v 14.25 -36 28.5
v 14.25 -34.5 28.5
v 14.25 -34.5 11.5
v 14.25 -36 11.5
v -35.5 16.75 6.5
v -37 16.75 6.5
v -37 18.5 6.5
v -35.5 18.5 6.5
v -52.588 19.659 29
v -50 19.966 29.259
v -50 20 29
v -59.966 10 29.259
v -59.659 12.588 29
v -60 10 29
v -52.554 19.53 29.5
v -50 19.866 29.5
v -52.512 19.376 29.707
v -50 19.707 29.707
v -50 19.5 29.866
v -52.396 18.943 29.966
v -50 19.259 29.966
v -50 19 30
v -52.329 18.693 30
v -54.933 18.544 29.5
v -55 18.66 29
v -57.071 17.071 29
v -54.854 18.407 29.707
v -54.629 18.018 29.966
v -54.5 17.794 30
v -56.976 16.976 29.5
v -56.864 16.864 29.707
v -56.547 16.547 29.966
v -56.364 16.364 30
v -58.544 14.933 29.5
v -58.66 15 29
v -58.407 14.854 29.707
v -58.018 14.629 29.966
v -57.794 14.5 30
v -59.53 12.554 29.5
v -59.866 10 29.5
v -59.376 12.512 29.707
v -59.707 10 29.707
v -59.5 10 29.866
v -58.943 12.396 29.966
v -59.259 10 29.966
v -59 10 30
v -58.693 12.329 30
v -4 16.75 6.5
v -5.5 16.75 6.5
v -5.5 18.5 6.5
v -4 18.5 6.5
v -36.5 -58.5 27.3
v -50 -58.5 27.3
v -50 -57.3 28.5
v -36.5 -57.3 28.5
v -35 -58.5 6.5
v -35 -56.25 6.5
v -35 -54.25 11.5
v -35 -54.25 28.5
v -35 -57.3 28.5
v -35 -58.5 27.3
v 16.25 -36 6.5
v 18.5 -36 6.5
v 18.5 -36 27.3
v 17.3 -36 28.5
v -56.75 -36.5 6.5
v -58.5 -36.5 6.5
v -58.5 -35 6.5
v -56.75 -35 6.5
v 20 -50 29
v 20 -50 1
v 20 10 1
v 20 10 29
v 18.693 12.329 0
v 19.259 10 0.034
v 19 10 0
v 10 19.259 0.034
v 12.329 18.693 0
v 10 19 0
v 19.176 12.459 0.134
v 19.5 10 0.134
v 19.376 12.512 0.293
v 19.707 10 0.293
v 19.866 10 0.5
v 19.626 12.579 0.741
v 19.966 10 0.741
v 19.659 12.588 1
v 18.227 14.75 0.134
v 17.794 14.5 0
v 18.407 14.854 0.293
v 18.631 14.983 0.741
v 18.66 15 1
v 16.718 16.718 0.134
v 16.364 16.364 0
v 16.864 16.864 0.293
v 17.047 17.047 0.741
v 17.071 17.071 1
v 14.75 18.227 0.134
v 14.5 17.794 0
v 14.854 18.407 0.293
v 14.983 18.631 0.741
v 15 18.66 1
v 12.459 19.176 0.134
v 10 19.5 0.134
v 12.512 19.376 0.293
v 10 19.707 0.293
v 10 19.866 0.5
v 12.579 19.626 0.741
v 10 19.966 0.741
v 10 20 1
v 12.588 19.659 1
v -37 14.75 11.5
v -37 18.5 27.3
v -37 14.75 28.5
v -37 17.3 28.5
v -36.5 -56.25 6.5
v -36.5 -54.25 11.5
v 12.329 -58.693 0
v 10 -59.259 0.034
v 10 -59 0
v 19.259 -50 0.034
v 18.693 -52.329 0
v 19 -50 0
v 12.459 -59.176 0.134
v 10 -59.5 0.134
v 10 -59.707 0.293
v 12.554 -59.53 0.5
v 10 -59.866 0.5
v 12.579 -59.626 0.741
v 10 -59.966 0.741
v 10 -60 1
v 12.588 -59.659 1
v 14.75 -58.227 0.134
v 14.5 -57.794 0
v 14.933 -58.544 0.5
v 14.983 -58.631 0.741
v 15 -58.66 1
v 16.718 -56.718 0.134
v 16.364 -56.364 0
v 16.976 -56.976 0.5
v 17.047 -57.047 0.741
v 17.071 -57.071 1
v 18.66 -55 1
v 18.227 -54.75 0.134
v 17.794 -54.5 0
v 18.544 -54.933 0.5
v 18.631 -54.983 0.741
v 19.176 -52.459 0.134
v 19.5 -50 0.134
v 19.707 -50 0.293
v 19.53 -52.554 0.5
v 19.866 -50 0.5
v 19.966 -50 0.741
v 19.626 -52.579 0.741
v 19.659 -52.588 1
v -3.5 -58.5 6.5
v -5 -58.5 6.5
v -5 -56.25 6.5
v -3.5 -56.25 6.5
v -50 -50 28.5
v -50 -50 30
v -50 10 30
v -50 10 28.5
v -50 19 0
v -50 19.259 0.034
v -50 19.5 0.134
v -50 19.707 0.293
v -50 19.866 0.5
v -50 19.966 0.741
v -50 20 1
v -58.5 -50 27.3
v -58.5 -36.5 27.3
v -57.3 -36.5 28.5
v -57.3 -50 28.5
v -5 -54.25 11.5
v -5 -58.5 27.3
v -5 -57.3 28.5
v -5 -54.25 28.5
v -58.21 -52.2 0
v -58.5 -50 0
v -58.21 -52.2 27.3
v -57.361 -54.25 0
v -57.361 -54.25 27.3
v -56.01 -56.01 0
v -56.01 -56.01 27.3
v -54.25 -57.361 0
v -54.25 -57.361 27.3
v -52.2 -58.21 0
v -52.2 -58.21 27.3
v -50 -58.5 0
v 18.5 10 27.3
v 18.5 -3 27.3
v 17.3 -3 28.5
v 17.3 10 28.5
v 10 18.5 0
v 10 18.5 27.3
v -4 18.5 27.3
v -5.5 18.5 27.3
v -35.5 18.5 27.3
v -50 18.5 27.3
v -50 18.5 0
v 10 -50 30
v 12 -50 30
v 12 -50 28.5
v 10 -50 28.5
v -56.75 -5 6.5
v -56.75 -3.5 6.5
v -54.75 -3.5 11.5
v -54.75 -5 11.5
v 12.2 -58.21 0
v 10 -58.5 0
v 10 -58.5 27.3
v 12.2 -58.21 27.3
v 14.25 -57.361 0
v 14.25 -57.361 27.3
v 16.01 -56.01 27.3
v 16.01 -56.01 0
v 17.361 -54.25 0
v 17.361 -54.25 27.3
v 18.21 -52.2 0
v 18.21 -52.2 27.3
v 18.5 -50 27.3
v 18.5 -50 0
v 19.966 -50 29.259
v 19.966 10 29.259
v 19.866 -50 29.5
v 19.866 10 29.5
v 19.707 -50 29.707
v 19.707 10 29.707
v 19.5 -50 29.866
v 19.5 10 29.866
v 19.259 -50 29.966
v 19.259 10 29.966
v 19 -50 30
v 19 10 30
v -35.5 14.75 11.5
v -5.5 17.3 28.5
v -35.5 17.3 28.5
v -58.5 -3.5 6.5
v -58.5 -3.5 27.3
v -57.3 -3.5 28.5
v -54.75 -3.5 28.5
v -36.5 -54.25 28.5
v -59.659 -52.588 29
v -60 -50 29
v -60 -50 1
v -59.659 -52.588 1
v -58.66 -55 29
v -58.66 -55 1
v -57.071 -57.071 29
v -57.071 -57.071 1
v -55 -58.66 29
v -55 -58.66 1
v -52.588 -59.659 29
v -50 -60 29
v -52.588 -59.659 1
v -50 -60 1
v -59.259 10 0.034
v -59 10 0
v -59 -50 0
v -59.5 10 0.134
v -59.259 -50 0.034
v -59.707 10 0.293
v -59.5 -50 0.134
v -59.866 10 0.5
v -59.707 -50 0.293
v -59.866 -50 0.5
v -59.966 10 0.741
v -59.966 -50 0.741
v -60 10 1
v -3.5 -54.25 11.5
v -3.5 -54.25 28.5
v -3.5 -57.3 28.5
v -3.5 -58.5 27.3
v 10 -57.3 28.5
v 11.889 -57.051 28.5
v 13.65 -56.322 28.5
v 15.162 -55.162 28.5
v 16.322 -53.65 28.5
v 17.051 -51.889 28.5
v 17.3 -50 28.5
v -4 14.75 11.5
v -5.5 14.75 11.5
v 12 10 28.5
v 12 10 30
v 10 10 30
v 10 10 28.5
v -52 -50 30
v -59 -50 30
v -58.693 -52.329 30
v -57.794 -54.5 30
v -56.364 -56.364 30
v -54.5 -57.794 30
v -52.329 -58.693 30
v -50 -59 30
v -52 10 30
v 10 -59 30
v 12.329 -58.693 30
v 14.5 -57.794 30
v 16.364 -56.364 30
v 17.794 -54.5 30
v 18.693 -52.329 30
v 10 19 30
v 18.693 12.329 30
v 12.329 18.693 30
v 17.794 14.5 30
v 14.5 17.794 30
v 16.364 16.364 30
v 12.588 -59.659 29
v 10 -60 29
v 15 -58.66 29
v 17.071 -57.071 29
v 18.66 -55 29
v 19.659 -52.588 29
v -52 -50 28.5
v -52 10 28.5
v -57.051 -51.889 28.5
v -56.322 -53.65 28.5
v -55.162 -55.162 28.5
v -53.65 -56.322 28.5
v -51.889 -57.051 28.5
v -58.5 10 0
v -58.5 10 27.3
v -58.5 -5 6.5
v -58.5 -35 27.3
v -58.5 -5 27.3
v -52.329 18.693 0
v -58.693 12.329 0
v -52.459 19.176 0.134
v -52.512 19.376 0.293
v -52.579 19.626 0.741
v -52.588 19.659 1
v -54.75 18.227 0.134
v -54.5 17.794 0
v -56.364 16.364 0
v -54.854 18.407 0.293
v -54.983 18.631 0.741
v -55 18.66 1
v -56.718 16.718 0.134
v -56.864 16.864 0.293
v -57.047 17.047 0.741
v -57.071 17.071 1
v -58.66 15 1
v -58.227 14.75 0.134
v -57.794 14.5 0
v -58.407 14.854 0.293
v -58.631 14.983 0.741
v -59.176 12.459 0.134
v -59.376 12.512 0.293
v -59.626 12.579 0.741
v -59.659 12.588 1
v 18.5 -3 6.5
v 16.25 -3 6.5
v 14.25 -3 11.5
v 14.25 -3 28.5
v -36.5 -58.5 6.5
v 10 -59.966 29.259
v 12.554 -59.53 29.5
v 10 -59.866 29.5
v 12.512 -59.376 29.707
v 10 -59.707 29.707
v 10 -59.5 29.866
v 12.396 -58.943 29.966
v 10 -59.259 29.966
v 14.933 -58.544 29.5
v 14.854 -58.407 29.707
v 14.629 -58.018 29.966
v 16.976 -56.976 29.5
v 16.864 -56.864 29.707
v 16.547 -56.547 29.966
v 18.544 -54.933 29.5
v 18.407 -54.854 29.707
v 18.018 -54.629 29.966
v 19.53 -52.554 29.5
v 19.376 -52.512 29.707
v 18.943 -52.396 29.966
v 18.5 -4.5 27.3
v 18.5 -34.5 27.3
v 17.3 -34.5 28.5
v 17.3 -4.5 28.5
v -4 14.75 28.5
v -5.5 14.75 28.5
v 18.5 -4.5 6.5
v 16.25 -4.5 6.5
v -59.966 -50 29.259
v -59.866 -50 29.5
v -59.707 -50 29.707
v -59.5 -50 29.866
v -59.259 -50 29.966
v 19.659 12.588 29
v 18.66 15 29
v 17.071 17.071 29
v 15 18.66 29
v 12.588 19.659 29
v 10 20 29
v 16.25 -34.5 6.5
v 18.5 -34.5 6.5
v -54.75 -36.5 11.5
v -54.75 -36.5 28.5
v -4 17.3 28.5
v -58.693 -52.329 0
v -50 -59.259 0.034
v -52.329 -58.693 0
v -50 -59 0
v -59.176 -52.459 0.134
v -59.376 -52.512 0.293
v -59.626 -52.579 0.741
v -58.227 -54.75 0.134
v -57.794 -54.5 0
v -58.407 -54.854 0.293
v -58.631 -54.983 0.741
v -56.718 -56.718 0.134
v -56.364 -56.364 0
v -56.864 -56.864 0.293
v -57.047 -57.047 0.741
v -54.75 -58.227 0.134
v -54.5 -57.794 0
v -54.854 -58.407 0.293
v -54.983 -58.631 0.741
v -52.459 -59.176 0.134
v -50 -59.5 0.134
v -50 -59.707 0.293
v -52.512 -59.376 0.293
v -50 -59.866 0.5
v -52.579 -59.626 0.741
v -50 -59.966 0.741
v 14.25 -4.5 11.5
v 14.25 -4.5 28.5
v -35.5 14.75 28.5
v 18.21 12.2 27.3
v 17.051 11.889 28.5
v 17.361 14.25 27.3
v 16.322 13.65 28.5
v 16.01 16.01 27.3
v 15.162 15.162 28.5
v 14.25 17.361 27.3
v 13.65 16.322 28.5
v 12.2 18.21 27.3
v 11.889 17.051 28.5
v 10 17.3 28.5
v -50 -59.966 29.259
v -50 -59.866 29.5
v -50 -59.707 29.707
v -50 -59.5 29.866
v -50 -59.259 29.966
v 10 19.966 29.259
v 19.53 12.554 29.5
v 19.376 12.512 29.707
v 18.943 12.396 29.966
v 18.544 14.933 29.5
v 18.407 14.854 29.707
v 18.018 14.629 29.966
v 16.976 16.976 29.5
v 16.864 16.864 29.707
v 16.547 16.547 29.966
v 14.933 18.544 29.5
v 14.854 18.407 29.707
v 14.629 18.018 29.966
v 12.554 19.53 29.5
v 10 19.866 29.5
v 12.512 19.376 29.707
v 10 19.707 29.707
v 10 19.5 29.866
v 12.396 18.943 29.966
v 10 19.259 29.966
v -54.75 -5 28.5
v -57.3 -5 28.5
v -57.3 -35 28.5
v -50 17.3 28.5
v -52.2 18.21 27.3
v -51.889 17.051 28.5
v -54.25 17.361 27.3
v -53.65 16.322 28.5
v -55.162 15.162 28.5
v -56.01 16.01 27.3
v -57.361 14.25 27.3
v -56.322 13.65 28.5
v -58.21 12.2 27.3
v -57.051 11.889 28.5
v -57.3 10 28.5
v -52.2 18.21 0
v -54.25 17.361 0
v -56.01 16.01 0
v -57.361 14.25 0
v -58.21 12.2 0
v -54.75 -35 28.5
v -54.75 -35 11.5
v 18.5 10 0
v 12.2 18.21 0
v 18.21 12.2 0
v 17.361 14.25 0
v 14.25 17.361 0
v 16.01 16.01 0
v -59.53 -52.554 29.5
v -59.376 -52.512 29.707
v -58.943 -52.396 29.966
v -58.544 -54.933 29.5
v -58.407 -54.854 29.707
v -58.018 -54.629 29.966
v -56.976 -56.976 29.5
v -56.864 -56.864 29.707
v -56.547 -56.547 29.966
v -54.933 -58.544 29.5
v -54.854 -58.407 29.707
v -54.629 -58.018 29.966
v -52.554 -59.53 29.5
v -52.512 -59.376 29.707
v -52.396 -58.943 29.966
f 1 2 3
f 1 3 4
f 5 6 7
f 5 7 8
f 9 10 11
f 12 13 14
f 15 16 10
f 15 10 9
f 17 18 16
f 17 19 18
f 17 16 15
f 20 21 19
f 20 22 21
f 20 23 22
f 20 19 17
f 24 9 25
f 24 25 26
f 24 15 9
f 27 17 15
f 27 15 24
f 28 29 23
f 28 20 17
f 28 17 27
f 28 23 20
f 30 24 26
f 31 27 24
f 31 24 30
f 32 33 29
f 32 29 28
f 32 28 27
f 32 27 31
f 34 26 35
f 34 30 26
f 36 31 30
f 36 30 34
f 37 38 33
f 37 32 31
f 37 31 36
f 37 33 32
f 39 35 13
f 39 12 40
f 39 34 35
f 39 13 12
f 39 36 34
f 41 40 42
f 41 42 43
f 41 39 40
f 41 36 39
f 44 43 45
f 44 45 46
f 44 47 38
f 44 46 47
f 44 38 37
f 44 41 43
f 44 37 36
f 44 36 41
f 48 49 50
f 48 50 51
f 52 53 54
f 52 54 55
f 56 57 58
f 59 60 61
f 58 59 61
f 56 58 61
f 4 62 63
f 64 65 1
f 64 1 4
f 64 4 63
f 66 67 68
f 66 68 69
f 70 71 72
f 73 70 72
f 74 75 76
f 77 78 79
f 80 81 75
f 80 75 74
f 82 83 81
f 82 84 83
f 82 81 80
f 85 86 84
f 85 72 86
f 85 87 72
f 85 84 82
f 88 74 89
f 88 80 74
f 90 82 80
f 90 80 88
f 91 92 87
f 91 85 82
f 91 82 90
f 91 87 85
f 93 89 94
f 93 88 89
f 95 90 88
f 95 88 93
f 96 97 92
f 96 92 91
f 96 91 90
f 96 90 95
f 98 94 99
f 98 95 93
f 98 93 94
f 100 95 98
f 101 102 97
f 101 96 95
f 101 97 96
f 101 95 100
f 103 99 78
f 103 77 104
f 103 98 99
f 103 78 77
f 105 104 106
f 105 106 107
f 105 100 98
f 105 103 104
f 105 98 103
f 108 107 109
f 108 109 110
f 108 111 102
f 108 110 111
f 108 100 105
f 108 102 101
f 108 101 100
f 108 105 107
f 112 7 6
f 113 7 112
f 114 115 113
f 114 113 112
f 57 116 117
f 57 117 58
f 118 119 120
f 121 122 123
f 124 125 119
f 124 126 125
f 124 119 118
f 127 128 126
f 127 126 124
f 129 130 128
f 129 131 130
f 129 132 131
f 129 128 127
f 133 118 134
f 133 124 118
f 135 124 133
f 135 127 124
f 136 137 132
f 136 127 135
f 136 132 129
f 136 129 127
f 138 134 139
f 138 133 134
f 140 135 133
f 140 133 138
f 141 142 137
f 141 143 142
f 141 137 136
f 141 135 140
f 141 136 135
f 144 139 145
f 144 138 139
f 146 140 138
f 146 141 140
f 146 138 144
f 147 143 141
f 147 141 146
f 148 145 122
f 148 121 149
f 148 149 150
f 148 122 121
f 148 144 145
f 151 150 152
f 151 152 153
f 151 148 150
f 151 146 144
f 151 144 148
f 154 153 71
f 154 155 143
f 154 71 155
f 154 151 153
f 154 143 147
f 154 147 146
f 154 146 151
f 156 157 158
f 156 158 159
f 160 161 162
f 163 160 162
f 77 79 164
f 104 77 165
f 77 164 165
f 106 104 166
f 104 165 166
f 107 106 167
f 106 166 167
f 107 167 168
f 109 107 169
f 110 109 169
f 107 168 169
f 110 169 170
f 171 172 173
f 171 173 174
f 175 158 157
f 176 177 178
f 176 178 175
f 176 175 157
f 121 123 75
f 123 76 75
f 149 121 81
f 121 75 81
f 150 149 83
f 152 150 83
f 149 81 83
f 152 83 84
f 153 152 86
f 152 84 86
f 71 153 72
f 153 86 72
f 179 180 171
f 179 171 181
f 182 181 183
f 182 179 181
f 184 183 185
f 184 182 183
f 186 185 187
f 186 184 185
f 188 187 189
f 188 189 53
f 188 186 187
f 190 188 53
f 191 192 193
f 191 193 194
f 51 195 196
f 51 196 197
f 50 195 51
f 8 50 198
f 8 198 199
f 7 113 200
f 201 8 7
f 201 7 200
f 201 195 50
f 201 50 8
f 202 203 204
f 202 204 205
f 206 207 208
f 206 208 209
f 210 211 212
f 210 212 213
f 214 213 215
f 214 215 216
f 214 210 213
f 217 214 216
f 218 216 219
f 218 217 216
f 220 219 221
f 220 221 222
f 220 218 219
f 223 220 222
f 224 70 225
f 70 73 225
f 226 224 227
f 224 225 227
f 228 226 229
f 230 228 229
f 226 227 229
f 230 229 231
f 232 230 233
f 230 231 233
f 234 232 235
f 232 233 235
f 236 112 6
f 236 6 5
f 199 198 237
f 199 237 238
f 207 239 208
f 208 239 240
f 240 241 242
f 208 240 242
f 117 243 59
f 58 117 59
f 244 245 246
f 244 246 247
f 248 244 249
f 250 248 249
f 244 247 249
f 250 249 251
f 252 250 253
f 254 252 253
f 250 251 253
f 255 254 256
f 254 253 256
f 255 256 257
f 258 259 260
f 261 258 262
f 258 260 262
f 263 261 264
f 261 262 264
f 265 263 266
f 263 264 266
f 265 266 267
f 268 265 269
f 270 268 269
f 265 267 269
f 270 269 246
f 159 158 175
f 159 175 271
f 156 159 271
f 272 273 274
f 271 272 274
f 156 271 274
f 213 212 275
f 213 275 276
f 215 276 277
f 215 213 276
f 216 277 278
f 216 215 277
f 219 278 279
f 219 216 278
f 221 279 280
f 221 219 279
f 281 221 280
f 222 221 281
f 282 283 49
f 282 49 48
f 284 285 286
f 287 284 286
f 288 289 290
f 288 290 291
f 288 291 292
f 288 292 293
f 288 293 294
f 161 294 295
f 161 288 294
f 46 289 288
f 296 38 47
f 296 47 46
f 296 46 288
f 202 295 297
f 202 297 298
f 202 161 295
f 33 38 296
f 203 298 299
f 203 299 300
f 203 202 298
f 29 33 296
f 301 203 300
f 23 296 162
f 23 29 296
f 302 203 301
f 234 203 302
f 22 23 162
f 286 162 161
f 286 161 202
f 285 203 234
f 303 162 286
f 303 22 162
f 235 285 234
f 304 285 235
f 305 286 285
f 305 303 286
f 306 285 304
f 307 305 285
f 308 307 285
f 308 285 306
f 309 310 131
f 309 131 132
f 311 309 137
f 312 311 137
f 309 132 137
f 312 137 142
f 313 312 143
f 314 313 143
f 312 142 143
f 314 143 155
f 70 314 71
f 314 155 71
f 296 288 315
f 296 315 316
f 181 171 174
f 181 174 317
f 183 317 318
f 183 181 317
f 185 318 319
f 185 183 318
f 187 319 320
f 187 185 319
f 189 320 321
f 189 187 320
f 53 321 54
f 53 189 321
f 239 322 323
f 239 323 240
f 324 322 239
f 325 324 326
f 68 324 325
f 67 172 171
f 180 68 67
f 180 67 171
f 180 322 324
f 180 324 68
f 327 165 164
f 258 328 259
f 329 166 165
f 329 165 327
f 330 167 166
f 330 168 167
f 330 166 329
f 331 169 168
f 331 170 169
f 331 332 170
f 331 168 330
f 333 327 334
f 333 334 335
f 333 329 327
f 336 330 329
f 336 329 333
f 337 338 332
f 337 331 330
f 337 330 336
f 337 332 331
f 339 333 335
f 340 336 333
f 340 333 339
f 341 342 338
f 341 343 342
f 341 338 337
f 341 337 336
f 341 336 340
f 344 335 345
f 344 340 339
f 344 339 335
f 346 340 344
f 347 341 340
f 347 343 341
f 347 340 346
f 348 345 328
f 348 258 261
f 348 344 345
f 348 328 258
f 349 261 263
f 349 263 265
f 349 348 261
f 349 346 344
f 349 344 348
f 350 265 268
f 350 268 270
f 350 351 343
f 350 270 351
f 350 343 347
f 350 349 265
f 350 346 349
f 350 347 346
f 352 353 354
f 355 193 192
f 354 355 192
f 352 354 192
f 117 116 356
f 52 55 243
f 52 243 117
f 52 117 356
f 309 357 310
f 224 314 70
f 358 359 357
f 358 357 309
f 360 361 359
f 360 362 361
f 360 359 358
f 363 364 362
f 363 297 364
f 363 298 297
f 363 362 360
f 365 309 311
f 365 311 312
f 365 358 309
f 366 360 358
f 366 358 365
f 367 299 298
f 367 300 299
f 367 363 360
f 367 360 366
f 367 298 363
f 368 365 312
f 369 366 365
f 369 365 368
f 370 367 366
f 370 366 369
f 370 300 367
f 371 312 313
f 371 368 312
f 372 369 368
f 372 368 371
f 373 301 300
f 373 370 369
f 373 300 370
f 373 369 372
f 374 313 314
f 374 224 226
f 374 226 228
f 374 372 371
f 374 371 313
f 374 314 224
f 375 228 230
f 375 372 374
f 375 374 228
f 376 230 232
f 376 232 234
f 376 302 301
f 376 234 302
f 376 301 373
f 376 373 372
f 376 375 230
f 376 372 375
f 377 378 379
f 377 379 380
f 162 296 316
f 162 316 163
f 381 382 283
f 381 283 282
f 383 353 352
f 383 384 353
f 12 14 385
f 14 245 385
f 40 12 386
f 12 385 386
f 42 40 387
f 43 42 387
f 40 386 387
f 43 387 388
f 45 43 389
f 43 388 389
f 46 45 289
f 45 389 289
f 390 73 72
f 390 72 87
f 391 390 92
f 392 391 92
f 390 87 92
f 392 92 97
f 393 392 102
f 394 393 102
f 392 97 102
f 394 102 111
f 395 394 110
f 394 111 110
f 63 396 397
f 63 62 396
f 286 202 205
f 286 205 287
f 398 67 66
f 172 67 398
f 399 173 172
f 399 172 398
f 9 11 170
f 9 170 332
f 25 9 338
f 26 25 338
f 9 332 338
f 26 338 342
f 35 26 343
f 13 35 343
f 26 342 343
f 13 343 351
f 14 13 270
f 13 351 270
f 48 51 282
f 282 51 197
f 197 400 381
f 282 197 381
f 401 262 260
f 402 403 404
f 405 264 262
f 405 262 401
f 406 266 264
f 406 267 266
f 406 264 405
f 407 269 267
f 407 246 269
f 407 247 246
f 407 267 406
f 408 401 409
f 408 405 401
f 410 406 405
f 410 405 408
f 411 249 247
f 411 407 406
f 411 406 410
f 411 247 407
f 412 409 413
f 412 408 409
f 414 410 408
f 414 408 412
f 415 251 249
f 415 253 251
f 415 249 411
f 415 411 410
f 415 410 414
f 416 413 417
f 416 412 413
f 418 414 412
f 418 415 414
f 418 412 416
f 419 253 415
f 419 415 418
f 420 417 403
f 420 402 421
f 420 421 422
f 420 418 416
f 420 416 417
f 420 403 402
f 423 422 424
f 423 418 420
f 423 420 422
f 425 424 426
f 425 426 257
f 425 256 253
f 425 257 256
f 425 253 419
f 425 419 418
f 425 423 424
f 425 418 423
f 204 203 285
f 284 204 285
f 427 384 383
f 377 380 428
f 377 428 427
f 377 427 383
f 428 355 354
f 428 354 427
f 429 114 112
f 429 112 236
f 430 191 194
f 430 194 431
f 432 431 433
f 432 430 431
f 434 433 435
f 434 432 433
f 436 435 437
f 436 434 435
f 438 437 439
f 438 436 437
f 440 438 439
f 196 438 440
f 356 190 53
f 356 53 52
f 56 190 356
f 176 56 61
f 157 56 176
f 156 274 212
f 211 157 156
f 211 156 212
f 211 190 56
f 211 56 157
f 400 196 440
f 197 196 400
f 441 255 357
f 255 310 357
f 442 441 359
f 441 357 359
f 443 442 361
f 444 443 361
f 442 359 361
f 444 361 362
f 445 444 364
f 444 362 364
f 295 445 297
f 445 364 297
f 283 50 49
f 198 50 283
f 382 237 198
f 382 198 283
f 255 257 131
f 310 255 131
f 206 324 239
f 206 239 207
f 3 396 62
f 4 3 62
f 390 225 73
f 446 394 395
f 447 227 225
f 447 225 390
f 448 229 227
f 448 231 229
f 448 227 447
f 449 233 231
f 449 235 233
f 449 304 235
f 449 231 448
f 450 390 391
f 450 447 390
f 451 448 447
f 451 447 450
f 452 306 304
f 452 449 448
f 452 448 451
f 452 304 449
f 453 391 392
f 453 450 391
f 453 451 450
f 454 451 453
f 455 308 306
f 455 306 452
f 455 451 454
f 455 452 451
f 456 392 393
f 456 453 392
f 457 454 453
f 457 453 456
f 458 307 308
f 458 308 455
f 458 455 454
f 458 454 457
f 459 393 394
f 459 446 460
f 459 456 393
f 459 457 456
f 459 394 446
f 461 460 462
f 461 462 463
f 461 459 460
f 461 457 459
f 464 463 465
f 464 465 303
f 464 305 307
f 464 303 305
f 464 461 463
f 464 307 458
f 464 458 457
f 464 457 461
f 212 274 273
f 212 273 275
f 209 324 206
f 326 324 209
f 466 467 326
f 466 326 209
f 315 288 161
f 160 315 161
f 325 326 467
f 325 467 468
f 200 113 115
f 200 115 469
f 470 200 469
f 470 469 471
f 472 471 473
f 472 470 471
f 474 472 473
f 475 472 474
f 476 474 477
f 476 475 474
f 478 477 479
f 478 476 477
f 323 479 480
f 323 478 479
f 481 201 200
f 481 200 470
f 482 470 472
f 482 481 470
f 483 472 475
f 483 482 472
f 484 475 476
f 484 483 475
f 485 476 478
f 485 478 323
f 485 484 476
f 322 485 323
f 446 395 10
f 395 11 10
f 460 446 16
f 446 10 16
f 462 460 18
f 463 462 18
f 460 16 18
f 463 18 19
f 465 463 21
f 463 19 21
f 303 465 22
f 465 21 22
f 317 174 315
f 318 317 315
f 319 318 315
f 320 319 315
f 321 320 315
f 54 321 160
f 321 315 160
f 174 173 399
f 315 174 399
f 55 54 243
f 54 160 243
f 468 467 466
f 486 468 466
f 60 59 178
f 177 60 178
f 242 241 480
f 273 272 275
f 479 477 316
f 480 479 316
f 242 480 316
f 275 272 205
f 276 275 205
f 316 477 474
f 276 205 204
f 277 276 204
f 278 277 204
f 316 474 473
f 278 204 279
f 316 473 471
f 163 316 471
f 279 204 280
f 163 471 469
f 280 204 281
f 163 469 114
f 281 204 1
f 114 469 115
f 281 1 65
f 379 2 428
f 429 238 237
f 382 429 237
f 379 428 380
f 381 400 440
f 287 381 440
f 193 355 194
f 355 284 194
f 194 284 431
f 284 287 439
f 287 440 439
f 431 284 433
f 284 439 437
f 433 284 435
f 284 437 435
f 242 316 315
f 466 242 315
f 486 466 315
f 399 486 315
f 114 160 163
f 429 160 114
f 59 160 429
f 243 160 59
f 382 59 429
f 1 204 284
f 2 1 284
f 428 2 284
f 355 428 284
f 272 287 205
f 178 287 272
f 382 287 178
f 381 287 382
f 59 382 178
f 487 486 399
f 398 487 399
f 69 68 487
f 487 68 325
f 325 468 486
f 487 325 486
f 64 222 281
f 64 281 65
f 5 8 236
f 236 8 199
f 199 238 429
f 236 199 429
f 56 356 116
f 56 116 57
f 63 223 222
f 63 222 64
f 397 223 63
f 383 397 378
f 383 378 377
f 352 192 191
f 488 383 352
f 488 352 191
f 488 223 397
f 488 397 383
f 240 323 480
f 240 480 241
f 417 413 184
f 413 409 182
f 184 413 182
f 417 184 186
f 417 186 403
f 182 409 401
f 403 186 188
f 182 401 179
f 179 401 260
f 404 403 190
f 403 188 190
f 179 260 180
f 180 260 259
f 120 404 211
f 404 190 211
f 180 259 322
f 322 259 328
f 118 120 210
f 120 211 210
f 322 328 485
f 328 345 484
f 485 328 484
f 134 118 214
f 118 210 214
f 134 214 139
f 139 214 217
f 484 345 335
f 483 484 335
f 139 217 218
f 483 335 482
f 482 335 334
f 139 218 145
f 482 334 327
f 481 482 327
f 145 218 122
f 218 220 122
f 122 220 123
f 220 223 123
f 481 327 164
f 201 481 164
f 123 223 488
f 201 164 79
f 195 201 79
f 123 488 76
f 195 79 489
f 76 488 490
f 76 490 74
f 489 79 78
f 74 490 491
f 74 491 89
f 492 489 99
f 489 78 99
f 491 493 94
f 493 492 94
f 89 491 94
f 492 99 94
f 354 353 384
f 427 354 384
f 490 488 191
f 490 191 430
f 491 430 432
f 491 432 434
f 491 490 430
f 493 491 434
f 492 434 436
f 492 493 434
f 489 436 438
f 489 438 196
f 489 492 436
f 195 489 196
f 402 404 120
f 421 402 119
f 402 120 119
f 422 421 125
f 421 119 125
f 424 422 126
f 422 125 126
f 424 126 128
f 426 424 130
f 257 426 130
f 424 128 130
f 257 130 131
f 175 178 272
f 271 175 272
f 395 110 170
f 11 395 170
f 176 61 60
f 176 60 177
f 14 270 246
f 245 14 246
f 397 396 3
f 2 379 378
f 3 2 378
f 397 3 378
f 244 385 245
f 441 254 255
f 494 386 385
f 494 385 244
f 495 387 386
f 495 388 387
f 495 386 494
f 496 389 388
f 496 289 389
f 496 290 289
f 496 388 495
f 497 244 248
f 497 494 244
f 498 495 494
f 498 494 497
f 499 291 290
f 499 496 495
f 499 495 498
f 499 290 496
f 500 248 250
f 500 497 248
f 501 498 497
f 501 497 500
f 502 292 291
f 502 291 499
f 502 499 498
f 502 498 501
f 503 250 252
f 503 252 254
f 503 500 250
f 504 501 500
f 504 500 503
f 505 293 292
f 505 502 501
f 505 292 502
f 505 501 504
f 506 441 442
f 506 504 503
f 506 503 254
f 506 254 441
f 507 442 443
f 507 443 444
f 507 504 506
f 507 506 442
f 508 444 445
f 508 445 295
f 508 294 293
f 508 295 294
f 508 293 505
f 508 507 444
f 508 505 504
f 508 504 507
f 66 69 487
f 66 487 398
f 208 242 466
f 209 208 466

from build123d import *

# Parameters (mm, degrees)
F1_DEPTH    = 30
F2_T        = -1.5
F3_W        = 1.5
F3_H        = 4.25
F3_W_2      = 4.25
F3_H_2      = 1.5
F4_DEPTH    = 22
F5_SIZE     = 1.2
F6_R        = 1
F7_W        = 2
F7_H        = 60
F8_DEPTH    = 30.001
F10_SIZE2   = 2
F10_SIZE    = 5
F10_2_SIZE2 = 2
F10_2_SIZE  = 5
F10_3_SIZE2 = 2
F10_3_SIZE  = 5
F10_4_SIZE2 = 2
F10_4_SIZE  = 5
F10_5_SIZE2 = 2
F10_5_SIZE  = 5
F10_6_SIZE2 = 2
F10_6_SIZE  = 5
F10_7_SIZE2 = 2
F10_7_SIZE  = 5
F10_8_SIZE2 = 2
F10_8_SIZE  = 5


# Not quite as in the source:
# - a pattern or mirror of a feature is missing from the dataset's text; its kind, count and spacing are read off the source's solid


with BuildPart() as f1:
    # F0 (on Top) → F1 (new body)
    with BuildSketch(Plane.XY):
        with BuildLine():
            ThreePointArc((20, 10), (17.0710678119, 17.0710678119), (10, 20))
            Line((10, 20), (-50, 20))
            ThreePointArc((-50, 20), (-57.0710678119, 17.0710678119), (-60, 10))
            Line((-60, 10), (-60, -50))
            ThreePointArc((-60, -50), (-57.0710678119, -57.0710678119), (-50, -60))
            Line((-50, -60), (10, -60))
            ThreePointArc((10, -60), (17.0710678119, -57.0710678119), (20, -50))
            Line((20, -50), (20, 10))
        make_face()
    extrude(amount=F1_DEPTH)

    # F2
    f2_openings = [f1.faces().sort_by_distance(p)[0] for p in [
        (-20, -20, 0),
    ]]
    offset(amount=F2_T, openings=f2_openings)

    # F3 (on face) → F4 (join)
    with BuildSketch(Plane(origin=(0, 0, 28.5), x_dir=(1, 0, 0), z_dir=(0, 0, -1))):
        with Locations((-35.75, 56.375)):
            Rectangle(F3_W, F3_H)
        with Locations((-4.25, 56.375)):
            Rectangle(F3_W, F3_H)
        with Locations((-56.875, 4.25)):
            Rectangle(F3_W_2, F3_H_2)
        with Locations((-56.875, 35.75)):
            Rectangle(F3_W_2, F3_H_2)
        with Locations((-4.75, -16.875)):
            Rectangle(F3_W, F3_H)
        with Locations((-36.25, -16.875)):
            Rectangle(F3_W, F3_H)
        with Locations((16.375, 35.25)):
            Rectangle(F3_W_2, F3_H_2)
        with Locations((16.375, 3.75)):
            Rectangle(F3_W_2, F3_H_2)
    extrude(amount=F4_DEPTH)

    # F5
    f5_edges = [f1.edges().sort_by_distance(p)[0] for p in [
        (3, 18.5, 28.5),
        (-20.5, 18.5, 28.5),
        (-43.5, 18.5, 28.5),
        (18.5, -19.5, 28.5),
        (18.5, -43, 28.5),
        (-58.5, -20, 28.5),
        (-58.5, -43.25, 28.5),
        (-20, -58.5, 28.5),
        (16.010408, 16.010408, 28.5),
        (18.5, 3.5, 28.5),
        (16.010408, -56.010408, 28.5),
        (3.25, -58.5, 28.5),
        (-43.25, -58.5, 28.5),
        (-56.010408, -56.010408, 28.5),
        (-58.5, 3.25, 28.5),
        (-56.010408, 16.010408, 28.5),
    ]]
    chamfer(f5_edges, length=F5_SIZE)

    # F6
    f6_edges = [f1.edges().sort_by_distance(p)[0] for p in [
        (20, -20, 30),
        (20, -20, 0),
        (17.071068, 17.071068, 0),
        (-20, 20, 0),
        (-57.071068, 17.071068, 0),
        (-60, -20, 0),
        (-57.071068, -57.071068, 0),
        (-20, -60, 0),
        (17.071068, -57.071068, 0),
        (17.071068, 17.071068, 30),
        (-20, 20, 30),
        (-57.071068, 17.071068, 30),
        (-60, -20, 30),
        (-57.071068, -57.071068, 30),
        (-20, -60, 30),
        (17.071068, -57.071068, 30),
    ]]
    fillet(f6_edges, radius=F6_R)

    # F7 (on face) → F8 (cut, through all)
    with BuildSketch(Plane.XY.offset(30)):
        with Locations((-51, -20)):
            Rectangle(F7_W, F7_H)
    f8 = extrude(amount=-F8_DEPTH, mode=Mode.SUBTRACT)

    # F8_copies: F8 across plane
    add(f8.mirror(Plane(origin=(-20, 0, 0), x_dir=(0, 0, 1), z_dir=(1, 0, 0))), mode=Mode.SUBTRACT)

    # F10
    f10_edges = [f1.edges().sort_by_distance(p)[0] for p in [
        (-54.75, -4.25, 6.5),
    ]]
    f10_side = f1.faces().sort_by_distance((-54.75, -4.25, 17.5))[0]
    chamfer(f10_edges, length=F10_SIZE, length2=F10_SIZE2, reference=f10_side)

    # F10#2
    f10_2_edges = [f1.edges().sort_by_distance(p)[0] for p in [
        (-54.75, -35.75, 6.5),
    ]]
    f10_2_side = f1.faces().sort_by_distance((-54.75, -35.75, 17.5))[0]
    chamfer(f10_2_edges, length=F10_2_SIZE, length2=F10_2_SIZE2, reference=f10_2_side)

    # F10#3
    f10_3_edges = [f1.edges().sort_by_distance(p)[0] for p in [
        (-35.75, -54.25, 6.5),
    ]]
    f10_3_side = f1.faces().sort_by_distance((-35.75, -54.25, 17.5))[0]
    chamfer(f10_3_edges, length=F10_3_SIZE, length2=F10_3_SIZE2, reference=f10_3_side)

    # F10#4
    f10_4_edges = [f1.edges().sort_by_distance(p)[0] for p in [
        (-4.25, -54.25, 6.5),
    ]]
    f10_4_side = f1.faces().sort_by_distance((-4.25, -54.25, 17.5))[0]
    chamfer(f10_4_edges, length=F10_4_SIZE, length2=F10_4_SIZE2, reference=f10_4_side)

    # F10#5
    f10_5_edges = [f1.edges().sort_by_distance(p)[0] for p in [
        (14.25, -35.25, 6.5),
    ]]
    f10_5_side = f1.faces().sort_by_distance((14.25, -35.25, 17.5))[0]
    chamfer(f10_5_edges, length=F10_5_SIZE, length2=F10_5_SIZE2, reference=f10_5_side)

    # F10#6
    f10_6_edges = [f1.edges().sort_by_distance(p)[0] for p in [
        (14.25, -3.75, 6.5),
    ]]
    f10_6_side = f1.faces().sort_by_distance((14.25, -3.75, 17.5))[0]
    chamfer(f10_6_edges, length=F10_6_SIZE, length2=F10_6_SIZE2, reference=f10_6_side)

    # F10#7
    f10_7_edges = [f1.edges().sort_by_distance(p)[0] for p in [
        (-4.75, 14.75, 6.5),
    ]]
    f10_7_side = f1.faces().sort_by_distance((-4.75, 14.75, 17.5))[0]
    chamfer(f10_7_edges, length=F10_7_SIZE, length2=F10_7_SIZE2, reference=f10_7_side)

    # F10#8
    f10_8_edges = [f1.edges().sort_by_distance(p)[0] for p in [
        (-36.25, 14.75, 6.5),
    ]]
    f10_8_side = f1.faces().sort_by_distance((-36.25, 14.75, 17.5))[0]
    chamfer(f10_8_edges, length=F10_8_SIZE, length2=F10_8_SIZE2, reference=f10_8_side)


solid = f1.part
